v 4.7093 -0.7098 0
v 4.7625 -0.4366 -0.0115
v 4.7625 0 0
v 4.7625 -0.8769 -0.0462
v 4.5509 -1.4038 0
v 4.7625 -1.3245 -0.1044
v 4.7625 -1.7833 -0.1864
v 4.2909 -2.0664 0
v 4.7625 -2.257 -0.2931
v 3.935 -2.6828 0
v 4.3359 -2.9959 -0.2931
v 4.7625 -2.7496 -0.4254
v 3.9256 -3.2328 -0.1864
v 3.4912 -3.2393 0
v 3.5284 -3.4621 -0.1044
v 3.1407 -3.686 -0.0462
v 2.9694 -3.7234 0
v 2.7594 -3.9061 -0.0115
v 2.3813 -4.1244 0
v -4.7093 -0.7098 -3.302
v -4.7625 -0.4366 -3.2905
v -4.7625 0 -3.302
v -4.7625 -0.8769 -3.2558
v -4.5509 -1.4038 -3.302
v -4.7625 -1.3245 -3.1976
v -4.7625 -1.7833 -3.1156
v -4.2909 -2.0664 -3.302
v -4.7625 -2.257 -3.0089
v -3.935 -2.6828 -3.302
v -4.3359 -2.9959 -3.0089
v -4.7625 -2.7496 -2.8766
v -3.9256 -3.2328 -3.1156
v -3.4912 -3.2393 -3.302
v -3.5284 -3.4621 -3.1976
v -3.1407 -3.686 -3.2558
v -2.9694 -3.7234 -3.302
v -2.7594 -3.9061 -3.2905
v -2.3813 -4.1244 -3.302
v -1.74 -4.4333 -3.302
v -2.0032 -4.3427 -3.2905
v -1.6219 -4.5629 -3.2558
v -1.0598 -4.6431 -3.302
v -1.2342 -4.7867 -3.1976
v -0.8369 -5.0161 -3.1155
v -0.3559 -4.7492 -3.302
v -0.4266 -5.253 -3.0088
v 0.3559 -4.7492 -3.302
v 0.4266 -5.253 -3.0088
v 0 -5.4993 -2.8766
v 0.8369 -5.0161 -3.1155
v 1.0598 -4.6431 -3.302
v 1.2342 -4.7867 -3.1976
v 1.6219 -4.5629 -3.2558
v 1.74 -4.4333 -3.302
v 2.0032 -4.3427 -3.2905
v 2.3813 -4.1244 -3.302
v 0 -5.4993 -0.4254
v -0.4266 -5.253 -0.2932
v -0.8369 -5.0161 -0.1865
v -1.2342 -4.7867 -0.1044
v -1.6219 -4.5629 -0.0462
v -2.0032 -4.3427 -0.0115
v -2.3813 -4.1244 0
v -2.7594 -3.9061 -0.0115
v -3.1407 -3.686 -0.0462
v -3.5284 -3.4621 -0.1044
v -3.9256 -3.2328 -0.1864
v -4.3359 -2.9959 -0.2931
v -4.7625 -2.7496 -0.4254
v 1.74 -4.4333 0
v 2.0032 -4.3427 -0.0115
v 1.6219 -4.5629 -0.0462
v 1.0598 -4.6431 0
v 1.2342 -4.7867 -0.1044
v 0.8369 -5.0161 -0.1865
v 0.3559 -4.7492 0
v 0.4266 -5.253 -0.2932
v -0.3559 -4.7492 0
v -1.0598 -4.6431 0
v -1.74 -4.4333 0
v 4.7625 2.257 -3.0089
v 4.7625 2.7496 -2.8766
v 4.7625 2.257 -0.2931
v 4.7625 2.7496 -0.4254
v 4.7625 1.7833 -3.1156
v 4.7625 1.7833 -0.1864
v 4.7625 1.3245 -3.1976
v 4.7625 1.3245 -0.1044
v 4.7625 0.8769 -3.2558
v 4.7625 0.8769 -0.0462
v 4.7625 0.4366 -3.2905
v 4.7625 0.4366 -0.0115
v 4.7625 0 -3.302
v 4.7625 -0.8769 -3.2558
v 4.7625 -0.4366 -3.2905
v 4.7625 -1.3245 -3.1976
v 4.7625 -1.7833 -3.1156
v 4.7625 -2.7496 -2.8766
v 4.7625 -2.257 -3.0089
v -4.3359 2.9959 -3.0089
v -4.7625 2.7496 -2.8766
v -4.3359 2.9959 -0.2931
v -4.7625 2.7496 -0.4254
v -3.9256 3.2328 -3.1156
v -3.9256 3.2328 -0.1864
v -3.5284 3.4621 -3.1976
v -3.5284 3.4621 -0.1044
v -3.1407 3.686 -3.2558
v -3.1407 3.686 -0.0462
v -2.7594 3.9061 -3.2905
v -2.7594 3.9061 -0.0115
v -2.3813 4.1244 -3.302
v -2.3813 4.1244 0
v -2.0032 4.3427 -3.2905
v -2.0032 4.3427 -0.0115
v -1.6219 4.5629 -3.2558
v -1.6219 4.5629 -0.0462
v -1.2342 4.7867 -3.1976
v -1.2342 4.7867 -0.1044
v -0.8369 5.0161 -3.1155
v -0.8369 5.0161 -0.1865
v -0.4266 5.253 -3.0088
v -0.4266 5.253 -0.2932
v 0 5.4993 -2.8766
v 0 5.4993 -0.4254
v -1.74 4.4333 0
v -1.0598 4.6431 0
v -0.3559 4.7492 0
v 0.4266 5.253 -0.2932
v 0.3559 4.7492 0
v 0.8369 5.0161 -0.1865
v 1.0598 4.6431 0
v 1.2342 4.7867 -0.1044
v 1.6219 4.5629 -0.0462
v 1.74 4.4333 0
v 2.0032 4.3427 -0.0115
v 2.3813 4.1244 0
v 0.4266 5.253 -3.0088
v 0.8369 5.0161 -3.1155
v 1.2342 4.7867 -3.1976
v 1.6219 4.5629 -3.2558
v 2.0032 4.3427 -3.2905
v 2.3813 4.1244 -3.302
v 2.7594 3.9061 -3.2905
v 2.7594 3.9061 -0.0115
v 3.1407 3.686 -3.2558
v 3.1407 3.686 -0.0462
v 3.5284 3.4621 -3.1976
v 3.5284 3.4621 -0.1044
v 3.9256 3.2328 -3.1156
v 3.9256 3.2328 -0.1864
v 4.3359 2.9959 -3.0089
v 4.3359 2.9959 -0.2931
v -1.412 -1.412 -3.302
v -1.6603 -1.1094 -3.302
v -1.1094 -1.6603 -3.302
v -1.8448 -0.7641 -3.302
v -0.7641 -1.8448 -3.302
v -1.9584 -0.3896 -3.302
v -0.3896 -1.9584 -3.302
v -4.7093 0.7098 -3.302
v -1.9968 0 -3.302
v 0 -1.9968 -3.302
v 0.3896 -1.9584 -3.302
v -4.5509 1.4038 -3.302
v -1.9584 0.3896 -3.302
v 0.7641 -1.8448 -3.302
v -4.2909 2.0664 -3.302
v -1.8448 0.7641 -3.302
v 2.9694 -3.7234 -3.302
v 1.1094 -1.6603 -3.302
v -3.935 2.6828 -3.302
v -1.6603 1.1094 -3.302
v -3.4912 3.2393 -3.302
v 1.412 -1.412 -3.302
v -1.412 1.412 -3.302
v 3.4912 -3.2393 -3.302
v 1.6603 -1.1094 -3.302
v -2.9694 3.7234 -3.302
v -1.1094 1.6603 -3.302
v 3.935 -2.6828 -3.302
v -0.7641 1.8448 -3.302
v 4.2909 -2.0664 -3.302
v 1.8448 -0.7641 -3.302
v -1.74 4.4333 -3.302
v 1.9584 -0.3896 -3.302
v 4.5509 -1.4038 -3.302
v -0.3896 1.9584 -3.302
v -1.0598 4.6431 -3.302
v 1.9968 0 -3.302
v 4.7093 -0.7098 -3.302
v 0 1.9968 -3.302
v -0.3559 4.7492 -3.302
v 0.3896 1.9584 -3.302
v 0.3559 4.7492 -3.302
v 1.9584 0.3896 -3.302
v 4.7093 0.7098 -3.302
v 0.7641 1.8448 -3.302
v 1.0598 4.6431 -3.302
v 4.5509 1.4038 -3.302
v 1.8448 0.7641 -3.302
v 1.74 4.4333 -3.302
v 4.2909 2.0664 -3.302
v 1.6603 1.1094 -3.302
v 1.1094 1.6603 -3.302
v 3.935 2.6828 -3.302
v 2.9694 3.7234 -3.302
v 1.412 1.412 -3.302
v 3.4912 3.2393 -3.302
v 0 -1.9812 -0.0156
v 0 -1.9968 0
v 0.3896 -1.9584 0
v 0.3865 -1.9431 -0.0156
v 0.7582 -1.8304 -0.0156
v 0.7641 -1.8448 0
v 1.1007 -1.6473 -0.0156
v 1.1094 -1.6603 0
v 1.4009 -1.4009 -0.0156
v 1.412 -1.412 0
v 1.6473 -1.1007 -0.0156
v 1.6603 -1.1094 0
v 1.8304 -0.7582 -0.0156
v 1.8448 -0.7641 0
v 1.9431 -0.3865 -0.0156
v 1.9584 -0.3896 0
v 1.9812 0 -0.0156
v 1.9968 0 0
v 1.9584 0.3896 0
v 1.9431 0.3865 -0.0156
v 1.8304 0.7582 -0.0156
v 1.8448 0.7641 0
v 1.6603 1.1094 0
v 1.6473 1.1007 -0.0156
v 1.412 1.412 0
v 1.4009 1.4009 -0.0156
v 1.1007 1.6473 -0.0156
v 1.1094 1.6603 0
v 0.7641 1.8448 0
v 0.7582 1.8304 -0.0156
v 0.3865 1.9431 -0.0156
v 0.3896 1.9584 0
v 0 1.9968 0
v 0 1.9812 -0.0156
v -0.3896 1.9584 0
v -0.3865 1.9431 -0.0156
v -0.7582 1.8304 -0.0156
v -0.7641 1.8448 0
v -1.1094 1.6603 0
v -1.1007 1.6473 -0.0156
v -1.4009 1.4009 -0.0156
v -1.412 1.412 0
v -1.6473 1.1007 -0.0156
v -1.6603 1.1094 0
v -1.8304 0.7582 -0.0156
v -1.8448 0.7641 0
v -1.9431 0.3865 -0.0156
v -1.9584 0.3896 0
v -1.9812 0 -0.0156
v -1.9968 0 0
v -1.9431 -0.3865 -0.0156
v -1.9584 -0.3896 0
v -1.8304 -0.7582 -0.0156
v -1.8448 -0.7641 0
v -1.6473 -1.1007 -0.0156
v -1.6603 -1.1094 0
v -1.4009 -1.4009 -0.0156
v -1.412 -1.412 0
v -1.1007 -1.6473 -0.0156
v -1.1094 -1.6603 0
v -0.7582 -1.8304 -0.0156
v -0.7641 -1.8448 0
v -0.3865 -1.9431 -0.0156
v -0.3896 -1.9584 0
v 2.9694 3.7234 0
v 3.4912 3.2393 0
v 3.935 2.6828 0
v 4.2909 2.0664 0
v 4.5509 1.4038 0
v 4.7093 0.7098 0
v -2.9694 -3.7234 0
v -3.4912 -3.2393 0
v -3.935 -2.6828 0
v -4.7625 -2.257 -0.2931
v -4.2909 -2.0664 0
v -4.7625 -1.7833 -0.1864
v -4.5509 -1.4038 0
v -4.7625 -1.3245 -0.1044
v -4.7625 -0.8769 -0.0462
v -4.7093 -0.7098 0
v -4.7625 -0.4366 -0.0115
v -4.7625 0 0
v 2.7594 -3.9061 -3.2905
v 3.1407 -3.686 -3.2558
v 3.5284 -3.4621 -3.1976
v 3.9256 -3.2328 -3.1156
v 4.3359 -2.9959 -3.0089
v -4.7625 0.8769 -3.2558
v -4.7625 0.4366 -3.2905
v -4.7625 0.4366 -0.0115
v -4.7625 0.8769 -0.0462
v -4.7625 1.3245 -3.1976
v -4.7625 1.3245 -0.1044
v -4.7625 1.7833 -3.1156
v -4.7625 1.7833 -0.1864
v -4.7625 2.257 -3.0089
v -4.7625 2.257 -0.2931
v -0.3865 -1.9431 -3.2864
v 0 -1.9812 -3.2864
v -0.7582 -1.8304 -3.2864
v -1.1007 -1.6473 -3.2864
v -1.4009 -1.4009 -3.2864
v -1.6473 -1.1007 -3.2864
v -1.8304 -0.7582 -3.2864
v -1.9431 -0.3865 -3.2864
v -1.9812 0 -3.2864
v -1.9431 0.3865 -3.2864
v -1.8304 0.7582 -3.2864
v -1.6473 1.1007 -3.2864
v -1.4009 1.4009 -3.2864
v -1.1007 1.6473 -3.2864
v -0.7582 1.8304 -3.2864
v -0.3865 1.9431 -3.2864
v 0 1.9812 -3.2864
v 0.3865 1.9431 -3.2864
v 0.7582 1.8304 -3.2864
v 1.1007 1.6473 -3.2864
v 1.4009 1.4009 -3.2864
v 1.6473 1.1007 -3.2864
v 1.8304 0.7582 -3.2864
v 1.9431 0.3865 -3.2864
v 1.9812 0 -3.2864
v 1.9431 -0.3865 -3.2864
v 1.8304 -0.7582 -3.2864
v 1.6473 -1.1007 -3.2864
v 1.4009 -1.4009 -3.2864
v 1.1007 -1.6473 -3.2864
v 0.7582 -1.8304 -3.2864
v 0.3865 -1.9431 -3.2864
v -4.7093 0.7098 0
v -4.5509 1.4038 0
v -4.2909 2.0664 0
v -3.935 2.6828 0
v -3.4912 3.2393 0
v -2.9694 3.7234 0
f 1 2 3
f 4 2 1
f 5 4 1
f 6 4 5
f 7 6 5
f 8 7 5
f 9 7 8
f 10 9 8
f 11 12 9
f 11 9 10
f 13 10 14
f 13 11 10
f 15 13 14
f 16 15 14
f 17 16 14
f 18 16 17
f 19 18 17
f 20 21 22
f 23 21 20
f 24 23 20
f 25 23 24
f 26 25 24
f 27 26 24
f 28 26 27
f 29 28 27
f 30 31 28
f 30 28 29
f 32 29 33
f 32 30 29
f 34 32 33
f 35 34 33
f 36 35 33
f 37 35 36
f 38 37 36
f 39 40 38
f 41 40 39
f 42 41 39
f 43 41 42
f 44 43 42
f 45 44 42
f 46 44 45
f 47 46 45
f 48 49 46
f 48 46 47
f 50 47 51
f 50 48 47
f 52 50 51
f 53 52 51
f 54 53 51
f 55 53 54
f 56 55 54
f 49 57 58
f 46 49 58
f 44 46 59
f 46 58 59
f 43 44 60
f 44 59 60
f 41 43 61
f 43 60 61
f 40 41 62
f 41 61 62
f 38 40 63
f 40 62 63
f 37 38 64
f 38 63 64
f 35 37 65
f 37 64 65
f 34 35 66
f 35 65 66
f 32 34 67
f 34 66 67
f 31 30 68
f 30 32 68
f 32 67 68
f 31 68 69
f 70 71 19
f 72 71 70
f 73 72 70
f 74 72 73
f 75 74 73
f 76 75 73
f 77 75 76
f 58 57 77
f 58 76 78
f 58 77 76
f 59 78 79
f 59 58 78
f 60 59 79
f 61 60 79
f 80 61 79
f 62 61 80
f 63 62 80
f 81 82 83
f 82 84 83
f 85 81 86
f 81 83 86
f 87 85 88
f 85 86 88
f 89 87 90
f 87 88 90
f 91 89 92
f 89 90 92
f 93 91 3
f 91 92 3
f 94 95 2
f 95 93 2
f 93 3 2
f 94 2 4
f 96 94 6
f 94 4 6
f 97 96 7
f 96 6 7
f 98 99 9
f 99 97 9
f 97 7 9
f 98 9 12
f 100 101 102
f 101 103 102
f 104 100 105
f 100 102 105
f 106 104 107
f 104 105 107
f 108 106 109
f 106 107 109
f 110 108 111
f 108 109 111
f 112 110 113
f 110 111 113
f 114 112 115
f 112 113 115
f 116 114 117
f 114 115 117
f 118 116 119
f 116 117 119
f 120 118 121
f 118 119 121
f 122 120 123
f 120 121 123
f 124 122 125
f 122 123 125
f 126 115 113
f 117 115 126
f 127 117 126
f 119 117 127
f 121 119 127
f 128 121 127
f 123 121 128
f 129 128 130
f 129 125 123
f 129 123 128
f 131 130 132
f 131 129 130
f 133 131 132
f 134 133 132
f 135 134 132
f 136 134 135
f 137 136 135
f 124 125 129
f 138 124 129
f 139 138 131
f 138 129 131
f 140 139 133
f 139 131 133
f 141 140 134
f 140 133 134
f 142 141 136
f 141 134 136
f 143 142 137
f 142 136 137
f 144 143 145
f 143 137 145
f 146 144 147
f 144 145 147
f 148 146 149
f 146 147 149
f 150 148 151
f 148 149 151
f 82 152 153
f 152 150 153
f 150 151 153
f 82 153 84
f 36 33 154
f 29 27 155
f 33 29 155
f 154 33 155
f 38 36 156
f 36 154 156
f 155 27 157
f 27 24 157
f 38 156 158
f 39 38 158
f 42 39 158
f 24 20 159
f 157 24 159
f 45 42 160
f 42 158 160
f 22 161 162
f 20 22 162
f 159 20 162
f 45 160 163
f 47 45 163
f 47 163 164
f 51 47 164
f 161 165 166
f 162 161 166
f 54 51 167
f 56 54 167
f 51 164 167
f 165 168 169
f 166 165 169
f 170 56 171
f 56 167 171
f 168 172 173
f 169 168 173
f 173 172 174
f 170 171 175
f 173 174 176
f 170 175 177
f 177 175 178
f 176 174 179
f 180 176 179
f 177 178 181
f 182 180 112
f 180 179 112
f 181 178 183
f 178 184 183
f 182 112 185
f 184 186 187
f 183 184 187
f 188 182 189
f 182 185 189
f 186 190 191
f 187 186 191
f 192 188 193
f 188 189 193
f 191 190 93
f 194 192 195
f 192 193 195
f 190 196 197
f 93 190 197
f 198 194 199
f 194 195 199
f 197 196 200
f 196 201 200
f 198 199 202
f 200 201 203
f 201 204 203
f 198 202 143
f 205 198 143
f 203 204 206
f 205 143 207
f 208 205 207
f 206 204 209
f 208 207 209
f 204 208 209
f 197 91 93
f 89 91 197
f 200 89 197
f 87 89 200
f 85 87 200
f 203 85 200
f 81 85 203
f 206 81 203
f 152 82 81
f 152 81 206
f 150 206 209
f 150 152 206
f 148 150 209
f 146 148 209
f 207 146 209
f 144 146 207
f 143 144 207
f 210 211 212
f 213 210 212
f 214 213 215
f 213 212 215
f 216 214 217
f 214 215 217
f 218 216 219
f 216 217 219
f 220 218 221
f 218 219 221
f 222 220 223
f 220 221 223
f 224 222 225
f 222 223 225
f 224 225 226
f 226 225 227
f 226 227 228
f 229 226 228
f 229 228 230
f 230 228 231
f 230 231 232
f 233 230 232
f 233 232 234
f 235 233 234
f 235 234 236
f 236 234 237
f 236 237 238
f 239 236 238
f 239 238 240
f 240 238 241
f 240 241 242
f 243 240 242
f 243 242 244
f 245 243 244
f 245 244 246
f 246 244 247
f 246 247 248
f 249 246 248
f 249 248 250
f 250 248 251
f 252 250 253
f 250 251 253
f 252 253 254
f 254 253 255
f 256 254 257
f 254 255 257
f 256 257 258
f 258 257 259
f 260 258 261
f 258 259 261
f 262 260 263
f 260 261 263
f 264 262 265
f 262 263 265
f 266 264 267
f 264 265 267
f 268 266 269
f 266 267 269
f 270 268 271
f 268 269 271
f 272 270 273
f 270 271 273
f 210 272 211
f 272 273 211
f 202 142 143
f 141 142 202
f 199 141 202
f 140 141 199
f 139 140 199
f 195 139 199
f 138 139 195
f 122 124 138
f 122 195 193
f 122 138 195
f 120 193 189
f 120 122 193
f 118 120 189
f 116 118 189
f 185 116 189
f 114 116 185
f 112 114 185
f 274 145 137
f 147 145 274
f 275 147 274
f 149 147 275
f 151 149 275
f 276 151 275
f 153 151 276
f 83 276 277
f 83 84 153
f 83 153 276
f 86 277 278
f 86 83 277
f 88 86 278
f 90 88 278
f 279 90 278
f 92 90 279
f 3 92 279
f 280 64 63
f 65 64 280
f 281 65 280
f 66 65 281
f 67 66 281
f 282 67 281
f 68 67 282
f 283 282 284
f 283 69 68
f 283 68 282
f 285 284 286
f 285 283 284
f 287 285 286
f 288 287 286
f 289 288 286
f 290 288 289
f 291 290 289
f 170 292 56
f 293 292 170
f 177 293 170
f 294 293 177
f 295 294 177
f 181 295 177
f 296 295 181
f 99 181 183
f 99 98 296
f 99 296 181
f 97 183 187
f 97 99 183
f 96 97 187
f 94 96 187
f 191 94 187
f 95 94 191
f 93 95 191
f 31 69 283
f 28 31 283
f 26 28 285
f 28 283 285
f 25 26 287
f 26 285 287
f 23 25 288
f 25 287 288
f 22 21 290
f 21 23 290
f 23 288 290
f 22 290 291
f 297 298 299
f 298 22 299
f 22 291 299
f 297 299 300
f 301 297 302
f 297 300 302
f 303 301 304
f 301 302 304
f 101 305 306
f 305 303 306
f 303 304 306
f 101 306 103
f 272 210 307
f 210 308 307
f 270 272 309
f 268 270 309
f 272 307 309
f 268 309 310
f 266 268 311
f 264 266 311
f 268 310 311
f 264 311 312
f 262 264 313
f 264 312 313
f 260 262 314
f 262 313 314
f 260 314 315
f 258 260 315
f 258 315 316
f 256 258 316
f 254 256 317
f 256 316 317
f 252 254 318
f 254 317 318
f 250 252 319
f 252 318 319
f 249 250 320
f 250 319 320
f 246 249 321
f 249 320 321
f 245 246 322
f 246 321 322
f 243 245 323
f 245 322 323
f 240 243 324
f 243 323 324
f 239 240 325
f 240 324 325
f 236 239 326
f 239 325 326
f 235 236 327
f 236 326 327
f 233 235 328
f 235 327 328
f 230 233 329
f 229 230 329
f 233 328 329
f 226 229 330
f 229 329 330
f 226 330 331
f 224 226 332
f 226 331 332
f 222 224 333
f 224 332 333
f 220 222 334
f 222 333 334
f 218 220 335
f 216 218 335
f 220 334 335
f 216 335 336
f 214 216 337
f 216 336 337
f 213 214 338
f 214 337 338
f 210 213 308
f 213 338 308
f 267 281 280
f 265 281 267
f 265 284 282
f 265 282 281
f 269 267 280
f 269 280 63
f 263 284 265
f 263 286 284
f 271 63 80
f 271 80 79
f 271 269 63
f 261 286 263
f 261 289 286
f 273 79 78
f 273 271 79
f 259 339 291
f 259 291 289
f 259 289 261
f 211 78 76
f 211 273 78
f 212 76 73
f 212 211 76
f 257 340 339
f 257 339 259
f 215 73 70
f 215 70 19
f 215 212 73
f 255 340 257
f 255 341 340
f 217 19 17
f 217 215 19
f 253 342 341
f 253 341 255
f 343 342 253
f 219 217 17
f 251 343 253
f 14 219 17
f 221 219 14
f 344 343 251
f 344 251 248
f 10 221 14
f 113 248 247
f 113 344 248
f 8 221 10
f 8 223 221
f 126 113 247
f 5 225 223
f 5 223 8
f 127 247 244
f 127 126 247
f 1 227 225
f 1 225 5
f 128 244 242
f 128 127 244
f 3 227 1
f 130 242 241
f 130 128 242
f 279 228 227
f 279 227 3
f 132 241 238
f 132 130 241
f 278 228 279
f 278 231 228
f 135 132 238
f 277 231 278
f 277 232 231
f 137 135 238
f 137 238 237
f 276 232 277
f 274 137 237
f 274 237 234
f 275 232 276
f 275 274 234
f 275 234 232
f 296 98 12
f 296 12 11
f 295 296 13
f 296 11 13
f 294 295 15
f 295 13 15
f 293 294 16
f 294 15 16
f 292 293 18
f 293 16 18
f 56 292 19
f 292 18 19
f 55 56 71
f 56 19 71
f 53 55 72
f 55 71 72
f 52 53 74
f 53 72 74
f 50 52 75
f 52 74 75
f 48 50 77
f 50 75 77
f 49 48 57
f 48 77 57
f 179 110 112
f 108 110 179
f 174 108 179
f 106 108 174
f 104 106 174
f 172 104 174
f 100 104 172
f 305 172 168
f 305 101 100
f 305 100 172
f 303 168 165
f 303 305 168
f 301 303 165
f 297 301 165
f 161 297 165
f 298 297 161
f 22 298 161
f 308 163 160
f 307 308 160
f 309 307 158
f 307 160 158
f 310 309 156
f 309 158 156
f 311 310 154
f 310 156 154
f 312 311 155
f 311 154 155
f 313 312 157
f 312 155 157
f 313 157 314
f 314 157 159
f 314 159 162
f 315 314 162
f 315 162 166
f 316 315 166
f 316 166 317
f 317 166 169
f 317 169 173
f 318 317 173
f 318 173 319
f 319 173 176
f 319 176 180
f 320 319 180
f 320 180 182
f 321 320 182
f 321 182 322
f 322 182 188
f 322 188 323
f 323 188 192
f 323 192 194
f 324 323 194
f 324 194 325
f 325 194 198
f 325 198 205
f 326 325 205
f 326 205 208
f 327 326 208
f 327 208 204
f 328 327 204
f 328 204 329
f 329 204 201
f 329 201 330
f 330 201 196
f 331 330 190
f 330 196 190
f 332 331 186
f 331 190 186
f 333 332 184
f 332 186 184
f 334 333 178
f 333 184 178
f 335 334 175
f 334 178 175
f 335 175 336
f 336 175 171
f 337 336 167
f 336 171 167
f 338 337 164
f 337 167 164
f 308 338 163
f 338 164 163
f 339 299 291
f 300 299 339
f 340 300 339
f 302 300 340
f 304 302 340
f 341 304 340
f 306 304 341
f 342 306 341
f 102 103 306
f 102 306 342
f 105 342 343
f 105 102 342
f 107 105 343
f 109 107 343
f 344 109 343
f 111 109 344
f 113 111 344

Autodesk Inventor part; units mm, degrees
ref_plane "YZ Plane" through (0, 0, 0) normal (1, 0, 0) x (0, 1, 0)
sketch "Sketch7" plane through (0, 0, 0) normal (0, 0, 1) x (1, 0, 0)
  circle A0 centre (0, 0) radius 4.7625 construction
  line L0 (-4.7625, -2.7496) -> (-4.7625, 2.7496)
  line L1 (-4.7625, 2.7496) -> (0, 5.4993)
  line L2 (0, 5.4993) -> (4.7625, 2.7496)
  line L3 (4.7625, 2.7496) -> (4.7625, -2.7496)
  line L4 (4.7625, -2.7496) -> (0, -5.4993)
  line L5 (0, -5.4993) -> (-4.7625, -2.7496)
  dimension "d40" = 9.525
extrude "Extrusion1" add sketch "Sketch7" against normal blind 3.302
sketch "Sketch11" plane through (0, 0, 0) normal (0, 0, 1) x (1, 0, 0)
  line L0 (0, 5.4993) -> (4.7625, 2.7496) projected
  line L1 (-4.7625, 2.7496) -> (0, 5.4993) projected
  line L2 (-4.7625, 2.7496) -> (4.7625, -2.7496) construction
  line L3 (-4.7625, -2.7496) -> (4.7625, 2.7496) construction
  point P0 (0, 0)
hole "Hole1" at (0, 0, 0) direction (0, 0, -1) diameter 3.9624 end through all thread size "10-32 UNF" class "2B" standard "ANSI Unified Screw Threads"
chamfer "Chamfer1" distance 0.0156 angle 45 2 edges at (0, 1.9812, 0) (0, 1.9812, -3.302)
sketch "Sketch9" plane through (0, 0, 0) normal (1, 0, 0) x (0, 1, 0)
  line L0 (-5.4993, -2.8766) -> (-5.4993, -3.302)
  line L1 (-5.4993, -3.302) -> (-4.7625, -3.302)
  line L2 (-4.7625, -3.302) -> (-5.4993, -2.8766)
  line L3 (0, -3.3871) -> (0, -2.7916) projected
  line L4 (-5.4993, -3.302) -> (-2.7496, -3.302) projected
  dimension "d38" = 9.525
  dimension "d41" = 150
revolve "Revolution1" cut sketch "Sketch9" angle 360 about axis through (0, 0, -10) along (0, 0, 1)
sketch "Sketch10" plane through (0, 0, 0) normal (1, 0, 0) x (0, 1, 0)
  line L0 (-5.4993, -0.4254) -> (-5.4993, 0)
  line L1 (-5.4993, 0) -> (-4.7625, 0)
  line L2 (-4.7625, 0) -> (-5.4993, -0.4254)
  line L3 (0, -0.5104) -> (0, 0.0851) projected
  line L4 (-2.7496, 0) -> (-5.4993, 0) projected
  dimension "d45" = 9.525
  dimension "d46" = 150
revolve "Revolution2" cut sketch "Sketch10" angle 360 about axis through (0, 0, -10) along (0, 0, 1)
ref_plane "MSC_PF1" through (0, 0, 0) normal (1, 0, 0) x (0, 1, 0)
ref_plane "MSC_PT1" through (0, 0, 0) normal (0, 0, 1) x (1, 0, 0)
equation "\"d38\" = Fbas"
equation "\"d40\" = Fbas"
equation "\"d29\" = Hbas"
equation "\"d63\" = 0.5 * PTC"
equation "\"d45\" = Fbas"
equation "\"Fbas\" = 9.525"
equation "\"Hbas\" = 3.302"
equation "\"NND\" = 4.826"
equation "\"THREADDIA\" = NND"
equation "\"PTC\" = 0.03125"
properties part number "ASME B18.6.3 - 10-32" material "Steel, Mild"
